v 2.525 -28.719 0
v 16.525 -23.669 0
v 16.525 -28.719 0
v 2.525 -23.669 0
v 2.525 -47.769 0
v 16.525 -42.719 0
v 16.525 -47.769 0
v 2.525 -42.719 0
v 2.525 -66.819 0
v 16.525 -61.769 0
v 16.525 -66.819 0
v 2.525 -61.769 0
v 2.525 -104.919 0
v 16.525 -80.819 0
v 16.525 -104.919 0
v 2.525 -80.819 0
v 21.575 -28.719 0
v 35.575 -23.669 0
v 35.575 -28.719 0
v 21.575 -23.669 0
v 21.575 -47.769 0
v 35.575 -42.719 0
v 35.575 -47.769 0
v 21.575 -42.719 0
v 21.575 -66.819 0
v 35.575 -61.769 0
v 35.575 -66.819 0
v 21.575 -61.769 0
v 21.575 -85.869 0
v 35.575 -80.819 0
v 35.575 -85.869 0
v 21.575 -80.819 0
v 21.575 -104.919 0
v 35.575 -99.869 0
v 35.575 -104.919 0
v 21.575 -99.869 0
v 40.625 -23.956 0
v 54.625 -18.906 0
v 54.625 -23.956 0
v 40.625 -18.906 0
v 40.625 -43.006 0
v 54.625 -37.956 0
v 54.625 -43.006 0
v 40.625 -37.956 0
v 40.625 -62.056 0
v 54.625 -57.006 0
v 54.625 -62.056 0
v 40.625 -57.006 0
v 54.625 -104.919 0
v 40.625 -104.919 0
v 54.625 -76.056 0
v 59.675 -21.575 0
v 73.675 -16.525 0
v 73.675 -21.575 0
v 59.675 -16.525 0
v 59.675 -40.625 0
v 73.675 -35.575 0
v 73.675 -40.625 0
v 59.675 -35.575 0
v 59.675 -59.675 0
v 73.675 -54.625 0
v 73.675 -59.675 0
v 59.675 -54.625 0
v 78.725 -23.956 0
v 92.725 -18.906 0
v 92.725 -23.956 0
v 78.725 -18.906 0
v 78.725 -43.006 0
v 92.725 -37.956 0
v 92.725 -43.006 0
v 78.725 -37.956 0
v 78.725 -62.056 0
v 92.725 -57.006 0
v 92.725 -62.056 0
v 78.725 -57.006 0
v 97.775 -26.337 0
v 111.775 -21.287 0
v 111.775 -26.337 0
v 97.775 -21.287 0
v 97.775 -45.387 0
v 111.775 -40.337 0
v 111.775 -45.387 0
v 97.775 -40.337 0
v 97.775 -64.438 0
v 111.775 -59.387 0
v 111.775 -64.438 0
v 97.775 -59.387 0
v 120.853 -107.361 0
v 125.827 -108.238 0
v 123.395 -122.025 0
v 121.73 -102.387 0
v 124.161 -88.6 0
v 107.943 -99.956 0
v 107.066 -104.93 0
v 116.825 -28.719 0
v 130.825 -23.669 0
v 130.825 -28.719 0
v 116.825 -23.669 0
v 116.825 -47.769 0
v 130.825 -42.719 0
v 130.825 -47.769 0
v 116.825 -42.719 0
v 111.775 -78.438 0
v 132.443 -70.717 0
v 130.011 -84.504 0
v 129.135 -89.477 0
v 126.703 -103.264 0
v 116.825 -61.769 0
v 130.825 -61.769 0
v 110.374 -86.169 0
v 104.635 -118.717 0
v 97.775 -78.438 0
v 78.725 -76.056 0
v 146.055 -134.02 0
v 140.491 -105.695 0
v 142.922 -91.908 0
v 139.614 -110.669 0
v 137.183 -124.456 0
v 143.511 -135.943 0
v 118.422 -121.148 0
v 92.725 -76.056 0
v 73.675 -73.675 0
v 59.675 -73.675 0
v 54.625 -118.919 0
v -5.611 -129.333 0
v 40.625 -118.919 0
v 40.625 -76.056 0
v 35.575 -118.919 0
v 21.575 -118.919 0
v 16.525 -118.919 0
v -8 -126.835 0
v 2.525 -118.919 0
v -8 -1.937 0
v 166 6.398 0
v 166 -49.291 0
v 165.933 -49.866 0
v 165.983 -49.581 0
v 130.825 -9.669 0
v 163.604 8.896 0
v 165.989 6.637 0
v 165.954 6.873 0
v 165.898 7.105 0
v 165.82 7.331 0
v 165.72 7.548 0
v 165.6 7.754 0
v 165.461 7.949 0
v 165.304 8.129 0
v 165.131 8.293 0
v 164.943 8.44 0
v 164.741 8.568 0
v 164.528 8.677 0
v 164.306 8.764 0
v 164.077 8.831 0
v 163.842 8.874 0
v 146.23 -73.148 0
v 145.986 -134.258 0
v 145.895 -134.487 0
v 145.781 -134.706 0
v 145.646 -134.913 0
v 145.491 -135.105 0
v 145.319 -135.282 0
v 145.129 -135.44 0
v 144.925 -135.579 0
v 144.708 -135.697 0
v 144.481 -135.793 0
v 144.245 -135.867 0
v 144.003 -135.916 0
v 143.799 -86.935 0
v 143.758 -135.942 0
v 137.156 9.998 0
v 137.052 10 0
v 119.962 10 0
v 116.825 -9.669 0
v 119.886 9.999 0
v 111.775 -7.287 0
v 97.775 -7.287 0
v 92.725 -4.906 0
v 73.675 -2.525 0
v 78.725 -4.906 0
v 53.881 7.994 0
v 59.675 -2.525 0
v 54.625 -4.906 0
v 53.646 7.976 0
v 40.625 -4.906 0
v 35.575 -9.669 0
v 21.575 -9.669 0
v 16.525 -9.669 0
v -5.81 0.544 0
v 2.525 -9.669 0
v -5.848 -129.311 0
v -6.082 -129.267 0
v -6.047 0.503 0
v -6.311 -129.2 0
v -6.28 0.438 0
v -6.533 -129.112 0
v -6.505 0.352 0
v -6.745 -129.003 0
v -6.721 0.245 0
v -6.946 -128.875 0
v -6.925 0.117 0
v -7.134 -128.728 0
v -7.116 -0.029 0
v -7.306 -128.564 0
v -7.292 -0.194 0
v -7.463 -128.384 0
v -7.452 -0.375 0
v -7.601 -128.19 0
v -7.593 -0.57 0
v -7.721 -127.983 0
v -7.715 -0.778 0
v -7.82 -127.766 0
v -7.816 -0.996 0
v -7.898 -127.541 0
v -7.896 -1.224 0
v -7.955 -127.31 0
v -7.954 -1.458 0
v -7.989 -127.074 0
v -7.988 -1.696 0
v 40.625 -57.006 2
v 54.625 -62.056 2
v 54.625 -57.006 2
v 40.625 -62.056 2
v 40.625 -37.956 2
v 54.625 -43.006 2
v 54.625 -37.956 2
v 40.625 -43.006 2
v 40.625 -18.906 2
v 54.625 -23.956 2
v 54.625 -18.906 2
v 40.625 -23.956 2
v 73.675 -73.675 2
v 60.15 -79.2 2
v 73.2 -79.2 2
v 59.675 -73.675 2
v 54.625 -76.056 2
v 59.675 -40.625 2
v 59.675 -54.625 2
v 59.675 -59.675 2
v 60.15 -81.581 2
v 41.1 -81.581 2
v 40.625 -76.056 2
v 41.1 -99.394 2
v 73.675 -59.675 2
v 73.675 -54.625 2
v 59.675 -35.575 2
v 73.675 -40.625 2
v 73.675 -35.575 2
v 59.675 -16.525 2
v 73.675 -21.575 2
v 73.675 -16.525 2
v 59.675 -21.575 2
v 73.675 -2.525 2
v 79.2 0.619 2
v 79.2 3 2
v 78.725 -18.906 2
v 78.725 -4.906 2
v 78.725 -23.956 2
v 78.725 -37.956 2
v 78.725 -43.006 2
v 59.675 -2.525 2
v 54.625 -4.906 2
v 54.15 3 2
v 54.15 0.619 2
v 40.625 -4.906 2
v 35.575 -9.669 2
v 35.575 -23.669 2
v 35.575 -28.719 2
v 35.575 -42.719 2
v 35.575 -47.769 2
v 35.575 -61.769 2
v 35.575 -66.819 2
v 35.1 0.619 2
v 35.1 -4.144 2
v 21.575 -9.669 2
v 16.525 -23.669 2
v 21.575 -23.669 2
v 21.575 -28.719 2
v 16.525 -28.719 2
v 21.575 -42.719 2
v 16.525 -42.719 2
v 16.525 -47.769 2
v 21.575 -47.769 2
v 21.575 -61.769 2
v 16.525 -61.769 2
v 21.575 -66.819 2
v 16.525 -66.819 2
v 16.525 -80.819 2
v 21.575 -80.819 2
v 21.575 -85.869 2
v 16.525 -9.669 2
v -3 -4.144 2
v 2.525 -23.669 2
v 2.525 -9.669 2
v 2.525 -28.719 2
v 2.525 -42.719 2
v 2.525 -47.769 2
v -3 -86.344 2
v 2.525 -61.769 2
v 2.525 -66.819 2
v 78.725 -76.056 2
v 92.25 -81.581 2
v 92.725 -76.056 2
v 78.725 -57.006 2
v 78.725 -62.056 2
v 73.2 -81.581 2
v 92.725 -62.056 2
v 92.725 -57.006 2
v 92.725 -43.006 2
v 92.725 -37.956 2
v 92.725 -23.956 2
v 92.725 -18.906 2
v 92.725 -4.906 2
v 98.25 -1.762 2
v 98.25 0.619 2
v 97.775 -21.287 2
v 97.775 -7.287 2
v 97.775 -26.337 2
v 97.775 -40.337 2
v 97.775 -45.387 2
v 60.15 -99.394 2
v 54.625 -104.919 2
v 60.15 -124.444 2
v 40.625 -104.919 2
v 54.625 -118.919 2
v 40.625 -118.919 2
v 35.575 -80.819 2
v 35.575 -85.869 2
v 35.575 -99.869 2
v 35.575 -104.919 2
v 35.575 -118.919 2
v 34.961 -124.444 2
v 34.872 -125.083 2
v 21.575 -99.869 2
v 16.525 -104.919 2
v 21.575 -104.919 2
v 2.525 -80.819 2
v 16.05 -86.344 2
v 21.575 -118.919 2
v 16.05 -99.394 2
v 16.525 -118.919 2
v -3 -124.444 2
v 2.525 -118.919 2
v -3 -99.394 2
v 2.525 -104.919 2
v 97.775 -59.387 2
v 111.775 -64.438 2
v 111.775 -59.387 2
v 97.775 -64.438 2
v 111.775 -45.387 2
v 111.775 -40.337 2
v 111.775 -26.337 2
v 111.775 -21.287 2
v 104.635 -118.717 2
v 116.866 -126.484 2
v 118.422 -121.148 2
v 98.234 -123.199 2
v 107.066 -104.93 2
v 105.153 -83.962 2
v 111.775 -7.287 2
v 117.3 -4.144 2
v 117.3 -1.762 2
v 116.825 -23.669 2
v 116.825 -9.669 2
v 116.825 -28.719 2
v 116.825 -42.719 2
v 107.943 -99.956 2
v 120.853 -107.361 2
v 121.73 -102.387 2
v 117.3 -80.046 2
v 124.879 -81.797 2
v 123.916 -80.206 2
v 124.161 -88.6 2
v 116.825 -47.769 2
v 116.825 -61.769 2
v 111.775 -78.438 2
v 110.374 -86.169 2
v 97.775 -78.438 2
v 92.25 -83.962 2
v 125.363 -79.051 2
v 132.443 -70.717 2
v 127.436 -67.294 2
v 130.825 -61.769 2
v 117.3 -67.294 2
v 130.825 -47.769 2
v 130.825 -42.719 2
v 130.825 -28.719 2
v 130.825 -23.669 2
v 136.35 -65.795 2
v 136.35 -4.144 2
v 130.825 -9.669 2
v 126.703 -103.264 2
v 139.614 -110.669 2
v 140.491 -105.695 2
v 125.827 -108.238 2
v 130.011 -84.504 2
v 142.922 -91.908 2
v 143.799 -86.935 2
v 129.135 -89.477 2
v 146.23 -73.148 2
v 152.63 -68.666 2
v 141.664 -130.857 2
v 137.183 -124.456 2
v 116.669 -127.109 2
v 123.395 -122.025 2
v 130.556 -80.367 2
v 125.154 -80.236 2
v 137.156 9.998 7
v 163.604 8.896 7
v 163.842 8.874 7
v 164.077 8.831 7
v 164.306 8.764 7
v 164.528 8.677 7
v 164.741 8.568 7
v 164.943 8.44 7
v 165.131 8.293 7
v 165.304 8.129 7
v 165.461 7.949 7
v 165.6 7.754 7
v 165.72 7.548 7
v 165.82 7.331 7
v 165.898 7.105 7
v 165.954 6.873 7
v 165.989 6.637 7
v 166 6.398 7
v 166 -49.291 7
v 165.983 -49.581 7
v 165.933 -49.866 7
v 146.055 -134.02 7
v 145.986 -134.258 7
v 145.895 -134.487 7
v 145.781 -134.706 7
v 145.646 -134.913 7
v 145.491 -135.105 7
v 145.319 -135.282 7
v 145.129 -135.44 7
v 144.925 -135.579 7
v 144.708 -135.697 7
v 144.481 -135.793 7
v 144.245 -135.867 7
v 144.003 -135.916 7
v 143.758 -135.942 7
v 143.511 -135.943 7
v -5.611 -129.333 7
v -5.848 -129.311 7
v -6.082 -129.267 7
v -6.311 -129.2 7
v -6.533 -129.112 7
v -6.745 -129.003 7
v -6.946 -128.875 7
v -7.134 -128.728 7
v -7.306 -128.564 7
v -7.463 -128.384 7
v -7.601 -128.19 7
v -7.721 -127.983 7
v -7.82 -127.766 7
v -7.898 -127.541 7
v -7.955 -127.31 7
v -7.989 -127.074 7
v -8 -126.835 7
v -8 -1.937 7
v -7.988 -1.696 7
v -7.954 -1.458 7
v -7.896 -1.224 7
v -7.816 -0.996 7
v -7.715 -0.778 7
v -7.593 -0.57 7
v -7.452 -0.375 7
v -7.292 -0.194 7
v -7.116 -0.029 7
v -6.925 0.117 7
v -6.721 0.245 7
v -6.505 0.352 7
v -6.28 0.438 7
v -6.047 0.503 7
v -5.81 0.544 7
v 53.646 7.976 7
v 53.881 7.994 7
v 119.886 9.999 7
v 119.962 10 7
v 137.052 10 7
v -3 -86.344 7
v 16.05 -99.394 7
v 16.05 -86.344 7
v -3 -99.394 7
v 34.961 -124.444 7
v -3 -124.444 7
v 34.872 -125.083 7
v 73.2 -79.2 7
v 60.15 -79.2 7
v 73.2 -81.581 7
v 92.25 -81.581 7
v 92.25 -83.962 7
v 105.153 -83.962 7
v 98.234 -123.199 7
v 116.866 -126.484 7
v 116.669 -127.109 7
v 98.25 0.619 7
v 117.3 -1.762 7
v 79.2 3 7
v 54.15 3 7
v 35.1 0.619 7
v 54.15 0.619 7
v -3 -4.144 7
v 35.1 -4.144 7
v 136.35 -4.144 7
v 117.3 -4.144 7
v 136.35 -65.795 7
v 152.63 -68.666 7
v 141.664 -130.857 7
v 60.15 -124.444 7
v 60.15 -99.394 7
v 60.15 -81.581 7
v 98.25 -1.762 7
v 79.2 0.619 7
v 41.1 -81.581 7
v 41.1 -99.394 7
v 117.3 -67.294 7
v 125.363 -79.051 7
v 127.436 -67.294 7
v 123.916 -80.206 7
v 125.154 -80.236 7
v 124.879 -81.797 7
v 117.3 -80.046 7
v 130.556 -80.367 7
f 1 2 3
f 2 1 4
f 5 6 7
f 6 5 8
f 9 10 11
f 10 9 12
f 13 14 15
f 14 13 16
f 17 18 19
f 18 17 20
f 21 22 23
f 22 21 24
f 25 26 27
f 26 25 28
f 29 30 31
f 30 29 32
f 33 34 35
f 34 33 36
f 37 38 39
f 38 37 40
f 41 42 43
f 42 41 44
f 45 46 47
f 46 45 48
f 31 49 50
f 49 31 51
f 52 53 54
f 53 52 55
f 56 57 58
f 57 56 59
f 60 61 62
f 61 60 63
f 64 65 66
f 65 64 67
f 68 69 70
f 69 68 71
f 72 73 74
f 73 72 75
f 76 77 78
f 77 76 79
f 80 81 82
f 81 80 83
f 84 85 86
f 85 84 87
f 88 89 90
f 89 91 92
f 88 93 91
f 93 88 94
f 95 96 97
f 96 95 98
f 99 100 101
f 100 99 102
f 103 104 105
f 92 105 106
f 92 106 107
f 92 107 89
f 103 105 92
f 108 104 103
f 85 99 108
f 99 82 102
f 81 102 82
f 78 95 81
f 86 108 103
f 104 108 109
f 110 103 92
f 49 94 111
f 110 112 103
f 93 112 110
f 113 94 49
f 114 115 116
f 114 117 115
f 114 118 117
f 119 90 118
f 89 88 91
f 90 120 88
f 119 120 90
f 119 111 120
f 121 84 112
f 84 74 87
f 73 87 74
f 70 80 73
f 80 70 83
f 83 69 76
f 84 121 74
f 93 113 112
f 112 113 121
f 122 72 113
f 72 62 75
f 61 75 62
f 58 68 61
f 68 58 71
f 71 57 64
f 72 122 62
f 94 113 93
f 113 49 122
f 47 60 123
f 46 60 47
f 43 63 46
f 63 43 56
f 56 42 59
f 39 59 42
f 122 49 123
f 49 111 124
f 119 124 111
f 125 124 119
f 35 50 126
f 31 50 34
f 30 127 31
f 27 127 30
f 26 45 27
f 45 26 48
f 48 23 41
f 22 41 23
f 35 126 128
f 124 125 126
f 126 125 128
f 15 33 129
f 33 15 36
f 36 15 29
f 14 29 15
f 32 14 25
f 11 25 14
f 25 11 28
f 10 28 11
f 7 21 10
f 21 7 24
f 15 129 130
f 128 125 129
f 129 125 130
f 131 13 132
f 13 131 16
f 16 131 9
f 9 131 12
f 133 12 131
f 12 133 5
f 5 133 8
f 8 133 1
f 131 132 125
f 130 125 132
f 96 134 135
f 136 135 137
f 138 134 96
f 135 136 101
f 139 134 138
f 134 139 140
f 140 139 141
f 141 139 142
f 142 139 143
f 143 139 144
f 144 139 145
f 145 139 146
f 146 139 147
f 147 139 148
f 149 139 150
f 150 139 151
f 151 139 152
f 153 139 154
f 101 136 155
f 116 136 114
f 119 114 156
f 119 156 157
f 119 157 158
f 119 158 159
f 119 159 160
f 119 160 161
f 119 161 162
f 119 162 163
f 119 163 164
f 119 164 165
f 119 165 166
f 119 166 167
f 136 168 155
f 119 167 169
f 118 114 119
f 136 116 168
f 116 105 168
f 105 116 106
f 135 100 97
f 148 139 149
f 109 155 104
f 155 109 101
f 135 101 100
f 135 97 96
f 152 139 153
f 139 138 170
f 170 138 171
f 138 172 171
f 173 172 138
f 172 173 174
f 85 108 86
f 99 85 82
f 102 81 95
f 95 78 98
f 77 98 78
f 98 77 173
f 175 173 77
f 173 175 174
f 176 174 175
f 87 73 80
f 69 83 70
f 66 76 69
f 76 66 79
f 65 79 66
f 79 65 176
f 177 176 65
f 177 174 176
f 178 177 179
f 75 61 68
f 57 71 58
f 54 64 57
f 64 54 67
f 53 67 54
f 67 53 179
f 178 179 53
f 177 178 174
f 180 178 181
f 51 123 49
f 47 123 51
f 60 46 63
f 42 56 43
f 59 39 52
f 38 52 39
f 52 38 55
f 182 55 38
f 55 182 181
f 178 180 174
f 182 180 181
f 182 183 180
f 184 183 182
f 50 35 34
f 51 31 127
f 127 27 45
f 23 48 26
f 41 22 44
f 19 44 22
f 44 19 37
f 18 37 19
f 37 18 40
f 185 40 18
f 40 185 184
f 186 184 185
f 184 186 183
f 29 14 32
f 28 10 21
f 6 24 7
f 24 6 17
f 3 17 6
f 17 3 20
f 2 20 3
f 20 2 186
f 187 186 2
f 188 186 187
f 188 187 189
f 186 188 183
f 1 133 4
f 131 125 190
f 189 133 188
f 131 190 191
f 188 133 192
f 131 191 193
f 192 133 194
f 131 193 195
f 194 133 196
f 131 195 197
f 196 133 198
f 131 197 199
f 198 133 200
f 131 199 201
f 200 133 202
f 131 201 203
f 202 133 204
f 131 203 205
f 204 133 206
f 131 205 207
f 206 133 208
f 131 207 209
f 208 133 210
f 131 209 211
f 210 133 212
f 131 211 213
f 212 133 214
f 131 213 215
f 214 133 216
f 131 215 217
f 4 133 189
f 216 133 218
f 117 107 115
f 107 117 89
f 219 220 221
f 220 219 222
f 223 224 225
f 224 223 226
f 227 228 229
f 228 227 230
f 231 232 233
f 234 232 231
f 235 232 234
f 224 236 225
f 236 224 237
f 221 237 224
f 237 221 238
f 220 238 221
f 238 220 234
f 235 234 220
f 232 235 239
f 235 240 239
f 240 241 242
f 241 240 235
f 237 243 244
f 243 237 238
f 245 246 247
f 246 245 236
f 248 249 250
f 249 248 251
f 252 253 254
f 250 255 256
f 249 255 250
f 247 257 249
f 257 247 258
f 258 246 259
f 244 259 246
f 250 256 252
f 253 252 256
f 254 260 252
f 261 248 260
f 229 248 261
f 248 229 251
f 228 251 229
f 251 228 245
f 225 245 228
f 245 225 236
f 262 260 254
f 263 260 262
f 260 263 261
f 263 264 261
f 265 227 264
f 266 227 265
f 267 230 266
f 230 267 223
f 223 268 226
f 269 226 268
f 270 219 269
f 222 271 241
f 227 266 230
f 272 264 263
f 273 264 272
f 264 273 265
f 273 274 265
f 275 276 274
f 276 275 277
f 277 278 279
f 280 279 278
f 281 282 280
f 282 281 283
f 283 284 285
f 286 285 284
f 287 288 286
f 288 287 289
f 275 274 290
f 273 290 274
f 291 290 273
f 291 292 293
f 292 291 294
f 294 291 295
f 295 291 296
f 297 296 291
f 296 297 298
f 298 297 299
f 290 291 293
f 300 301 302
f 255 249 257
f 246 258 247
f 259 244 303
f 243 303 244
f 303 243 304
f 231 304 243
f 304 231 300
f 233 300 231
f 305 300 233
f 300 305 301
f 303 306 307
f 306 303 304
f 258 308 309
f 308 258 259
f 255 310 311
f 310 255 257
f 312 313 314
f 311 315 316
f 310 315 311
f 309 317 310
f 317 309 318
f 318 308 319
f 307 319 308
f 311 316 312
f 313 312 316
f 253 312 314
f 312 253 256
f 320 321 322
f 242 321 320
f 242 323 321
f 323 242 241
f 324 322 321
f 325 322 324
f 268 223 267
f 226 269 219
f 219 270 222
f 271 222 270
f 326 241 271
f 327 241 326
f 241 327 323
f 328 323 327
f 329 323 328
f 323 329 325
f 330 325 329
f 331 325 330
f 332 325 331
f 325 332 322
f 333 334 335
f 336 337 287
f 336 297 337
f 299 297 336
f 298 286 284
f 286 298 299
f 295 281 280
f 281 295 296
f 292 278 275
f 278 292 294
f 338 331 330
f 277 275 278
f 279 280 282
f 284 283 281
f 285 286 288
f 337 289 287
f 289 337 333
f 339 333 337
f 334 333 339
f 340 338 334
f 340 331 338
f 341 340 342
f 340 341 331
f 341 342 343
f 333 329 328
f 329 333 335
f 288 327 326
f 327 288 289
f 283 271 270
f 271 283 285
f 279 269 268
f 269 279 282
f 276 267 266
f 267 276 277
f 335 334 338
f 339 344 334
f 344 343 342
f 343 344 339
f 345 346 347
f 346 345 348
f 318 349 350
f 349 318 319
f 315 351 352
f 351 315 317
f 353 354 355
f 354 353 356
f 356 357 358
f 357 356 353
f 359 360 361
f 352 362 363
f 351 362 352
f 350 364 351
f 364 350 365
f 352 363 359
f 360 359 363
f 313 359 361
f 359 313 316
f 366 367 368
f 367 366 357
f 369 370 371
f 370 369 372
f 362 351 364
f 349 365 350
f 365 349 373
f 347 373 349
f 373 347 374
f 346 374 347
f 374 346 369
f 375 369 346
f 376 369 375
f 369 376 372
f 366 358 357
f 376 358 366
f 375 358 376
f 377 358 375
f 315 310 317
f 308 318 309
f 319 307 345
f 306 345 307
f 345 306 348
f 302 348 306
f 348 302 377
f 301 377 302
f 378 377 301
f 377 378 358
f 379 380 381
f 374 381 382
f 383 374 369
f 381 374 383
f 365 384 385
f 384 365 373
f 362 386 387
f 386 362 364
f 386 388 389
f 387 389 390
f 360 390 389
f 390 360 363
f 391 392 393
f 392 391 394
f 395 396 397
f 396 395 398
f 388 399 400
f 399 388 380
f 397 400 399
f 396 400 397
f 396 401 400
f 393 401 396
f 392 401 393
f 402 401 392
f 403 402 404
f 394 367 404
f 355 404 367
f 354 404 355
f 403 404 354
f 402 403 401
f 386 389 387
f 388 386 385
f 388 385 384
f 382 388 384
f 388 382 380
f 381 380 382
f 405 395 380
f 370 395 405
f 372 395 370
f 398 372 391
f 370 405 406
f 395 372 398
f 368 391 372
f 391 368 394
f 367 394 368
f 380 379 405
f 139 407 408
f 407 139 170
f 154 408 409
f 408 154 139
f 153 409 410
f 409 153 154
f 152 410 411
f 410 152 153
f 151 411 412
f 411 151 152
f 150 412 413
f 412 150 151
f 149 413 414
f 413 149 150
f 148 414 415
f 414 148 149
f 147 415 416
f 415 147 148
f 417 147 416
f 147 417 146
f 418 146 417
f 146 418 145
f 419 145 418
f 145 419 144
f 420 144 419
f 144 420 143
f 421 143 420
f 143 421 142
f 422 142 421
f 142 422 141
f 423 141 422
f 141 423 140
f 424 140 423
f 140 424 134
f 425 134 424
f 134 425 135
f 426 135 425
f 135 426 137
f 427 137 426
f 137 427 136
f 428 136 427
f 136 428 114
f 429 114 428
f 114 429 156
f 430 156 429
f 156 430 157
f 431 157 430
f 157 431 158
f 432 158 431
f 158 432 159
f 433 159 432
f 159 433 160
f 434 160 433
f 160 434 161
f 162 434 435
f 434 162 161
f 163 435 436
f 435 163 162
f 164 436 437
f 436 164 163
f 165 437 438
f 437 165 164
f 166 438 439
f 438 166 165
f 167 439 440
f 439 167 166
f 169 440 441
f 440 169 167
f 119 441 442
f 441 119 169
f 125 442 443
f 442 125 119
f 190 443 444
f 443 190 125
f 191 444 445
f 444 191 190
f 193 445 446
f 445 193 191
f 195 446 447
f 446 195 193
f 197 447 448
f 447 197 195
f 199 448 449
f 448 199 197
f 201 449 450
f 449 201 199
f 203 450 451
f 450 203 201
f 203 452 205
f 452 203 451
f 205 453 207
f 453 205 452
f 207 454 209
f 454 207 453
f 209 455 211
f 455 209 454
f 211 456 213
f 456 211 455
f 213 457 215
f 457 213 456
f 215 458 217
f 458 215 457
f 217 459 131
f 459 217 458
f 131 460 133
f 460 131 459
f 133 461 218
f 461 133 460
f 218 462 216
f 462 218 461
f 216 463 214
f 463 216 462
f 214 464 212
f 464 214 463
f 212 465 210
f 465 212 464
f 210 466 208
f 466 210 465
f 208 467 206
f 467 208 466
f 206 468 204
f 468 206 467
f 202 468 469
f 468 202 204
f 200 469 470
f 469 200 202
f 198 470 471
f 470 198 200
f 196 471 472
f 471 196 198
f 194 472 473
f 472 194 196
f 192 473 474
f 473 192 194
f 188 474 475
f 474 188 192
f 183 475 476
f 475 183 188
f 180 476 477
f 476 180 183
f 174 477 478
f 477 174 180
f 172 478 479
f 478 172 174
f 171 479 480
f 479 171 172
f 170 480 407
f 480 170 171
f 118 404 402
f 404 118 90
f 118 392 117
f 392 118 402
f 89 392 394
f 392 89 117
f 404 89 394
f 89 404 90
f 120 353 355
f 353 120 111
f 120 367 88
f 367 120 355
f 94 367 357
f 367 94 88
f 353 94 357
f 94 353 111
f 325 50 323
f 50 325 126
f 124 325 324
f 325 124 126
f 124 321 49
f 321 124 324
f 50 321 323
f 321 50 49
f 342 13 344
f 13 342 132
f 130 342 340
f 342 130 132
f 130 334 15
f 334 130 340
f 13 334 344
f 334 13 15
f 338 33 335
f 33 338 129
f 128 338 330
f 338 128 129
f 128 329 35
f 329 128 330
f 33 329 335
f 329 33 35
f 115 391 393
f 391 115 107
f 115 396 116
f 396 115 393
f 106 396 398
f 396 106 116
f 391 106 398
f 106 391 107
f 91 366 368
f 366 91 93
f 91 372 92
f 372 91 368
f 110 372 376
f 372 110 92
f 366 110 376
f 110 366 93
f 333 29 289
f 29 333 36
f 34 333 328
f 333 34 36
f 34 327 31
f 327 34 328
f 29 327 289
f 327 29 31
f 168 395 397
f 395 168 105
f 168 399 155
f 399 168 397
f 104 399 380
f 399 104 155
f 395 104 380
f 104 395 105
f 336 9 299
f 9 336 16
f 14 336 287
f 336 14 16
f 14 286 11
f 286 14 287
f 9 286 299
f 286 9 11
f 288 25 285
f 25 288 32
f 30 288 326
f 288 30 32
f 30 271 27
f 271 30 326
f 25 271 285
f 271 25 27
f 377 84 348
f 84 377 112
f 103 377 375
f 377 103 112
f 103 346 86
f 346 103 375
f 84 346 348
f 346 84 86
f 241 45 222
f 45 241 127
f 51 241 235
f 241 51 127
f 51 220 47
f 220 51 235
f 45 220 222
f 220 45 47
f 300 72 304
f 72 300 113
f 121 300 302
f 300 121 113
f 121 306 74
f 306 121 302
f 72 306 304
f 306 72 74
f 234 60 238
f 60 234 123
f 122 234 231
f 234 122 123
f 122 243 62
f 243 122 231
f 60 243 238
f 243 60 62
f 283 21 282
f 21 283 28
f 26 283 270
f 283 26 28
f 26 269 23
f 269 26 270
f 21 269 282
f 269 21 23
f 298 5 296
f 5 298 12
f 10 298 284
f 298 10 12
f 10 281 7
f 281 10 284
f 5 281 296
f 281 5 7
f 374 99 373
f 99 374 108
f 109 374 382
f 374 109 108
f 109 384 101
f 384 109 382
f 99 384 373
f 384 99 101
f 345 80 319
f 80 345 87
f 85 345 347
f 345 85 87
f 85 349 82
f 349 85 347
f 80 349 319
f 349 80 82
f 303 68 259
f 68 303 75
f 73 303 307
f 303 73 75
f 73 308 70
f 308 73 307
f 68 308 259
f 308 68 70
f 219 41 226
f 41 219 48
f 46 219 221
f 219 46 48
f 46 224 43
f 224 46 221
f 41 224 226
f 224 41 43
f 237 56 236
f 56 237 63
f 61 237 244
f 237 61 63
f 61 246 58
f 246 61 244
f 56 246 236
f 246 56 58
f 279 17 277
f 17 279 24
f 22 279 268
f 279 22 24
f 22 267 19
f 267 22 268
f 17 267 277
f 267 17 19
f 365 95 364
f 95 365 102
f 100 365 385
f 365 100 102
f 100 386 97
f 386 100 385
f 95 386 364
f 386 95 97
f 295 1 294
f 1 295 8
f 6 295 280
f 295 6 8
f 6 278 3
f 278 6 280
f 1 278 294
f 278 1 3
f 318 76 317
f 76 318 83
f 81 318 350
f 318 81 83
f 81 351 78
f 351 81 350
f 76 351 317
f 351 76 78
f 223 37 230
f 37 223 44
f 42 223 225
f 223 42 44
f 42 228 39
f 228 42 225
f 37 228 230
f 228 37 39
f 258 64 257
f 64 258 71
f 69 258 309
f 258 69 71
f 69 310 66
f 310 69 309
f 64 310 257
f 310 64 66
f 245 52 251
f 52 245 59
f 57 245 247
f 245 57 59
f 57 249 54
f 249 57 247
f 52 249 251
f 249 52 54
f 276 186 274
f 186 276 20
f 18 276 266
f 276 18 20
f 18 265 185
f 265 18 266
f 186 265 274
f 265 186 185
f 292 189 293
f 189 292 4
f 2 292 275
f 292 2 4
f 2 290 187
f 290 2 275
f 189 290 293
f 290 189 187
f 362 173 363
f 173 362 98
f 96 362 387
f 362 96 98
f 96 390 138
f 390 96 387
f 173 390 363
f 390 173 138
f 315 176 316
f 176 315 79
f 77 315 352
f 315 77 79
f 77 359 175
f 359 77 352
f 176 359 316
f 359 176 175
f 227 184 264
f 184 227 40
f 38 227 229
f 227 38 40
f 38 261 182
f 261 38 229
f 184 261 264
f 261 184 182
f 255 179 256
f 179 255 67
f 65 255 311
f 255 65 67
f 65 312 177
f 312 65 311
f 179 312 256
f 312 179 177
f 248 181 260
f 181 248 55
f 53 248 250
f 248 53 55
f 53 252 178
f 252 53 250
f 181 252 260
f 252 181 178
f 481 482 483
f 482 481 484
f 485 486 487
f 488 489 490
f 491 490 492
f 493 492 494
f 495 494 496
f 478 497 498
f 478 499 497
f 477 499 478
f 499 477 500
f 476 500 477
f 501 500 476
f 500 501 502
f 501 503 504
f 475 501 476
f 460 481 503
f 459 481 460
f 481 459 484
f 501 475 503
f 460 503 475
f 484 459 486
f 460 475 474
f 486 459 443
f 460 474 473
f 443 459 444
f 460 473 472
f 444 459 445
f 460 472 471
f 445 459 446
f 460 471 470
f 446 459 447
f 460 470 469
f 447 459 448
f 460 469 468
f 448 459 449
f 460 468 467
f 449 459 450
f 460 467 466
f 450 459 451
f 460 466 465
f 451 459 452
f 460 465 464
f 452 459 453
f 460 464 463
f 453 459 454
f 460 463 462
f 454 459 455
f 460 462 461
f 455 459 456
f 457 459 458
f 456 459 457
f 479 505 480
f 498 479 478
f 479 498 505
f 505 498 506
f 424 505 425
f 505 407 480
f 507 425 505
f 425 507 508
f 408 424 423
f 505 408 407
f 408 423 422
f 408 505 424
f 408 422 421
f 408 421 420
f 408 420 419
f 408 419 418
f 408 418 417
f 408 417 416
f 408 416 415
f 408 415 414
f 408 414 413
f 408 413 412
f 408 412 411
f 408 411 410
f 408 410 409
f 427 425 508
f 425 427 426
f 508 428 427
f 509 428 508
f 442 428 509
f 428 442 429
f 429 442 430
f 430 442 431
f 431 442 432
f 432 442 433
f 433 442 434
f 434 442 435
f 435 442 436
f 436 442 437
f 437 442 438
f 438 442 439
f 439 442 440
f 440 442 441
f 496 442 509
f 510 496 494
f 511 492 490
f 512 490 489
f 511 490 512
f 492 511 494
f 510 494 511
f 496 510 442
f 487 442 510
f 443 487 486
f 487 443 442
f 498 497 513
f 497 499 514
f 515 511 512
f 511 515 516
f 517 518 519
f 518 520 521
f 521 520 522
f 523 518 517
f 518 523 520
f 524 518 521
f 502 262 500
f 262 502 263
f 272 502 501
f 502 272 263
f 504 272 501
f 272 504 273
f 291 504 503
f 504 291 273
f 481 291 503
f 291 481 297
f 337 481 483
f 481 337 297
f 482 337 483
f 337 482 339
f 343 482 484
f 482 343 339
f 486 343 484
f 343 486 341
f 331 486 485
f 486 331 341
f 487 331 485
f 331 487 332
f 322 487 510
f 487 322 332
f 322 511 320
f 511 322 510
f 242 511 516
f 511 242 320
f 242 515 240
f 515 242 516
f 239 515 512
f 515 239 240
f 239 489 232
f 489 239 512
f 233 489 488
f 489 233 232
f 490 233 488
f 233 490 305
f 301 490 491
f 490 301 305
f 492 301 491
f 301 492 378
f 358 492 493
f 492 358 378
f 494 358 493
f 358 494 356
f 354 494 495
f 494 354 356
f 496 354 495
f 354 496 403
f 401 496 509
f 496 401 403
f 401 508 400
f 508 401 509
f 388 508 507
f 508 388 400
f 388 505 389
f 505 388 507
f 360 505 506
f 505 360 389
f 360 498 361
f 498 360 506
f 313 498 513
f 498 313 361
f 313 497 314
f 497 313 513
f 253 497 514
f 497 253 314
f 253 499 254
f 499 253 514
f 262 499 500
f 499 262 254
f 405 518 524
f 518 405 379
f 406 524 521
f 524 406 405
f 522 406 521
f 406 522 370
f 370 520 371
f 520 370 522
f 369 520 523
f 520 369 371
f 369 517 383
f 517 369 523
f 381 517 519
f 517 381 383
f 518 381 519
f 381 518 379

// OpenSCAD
mirror([0, 1, 0]) color("grey") {
union() {
linear_extrude(height=2) {
polygon([[119.9620436791635, -10.0], [119.88614853201763, -9.998847719777999], [53.880686985647216, -7.994126032720432], [53.646495296320076, -7.975973004726603], [-5.810086836473021, -0.5439002381274649], [-6.047487665291121, -0.5025204617148387], [-6.279801550623147, -0.4384759607689326], [-6.504869964194179, -0.3523618003068363], [-6.720601698525187, -0.2449781040489396], [-6.9249922972416, -0.11732262012514494], [-7.116142679340018, 0.029418549432351115], [-7.292276784366992, 0.19388196927341883], [-7.451758074560958, 0.3745395389945354], [-7.593104740628792, 0.569712691377185], [-7.71500346987358, 0.7775879886781831], [-7.816321648748018, 0.9962339720600868], [-7.896117886454252, 1.2236191076063734], [-7.953650761810862, 1.45763066217724], [-7.988385712116106, 1.69609433372233], [-8.0, 1.9367944536567043], [-8.000000000000002, 99.39375], [-7.999999999999999, 126.83538329329558], [-7.988630737664156, 127.07353671349598], [-7.954626358757477, 127.30952403072804], [-7.898296147043448, 127.54119884361772], [-7.820152448885596, 127.76645397478553], [-7.720906013247321, 127.98324063648849], [-7.601459527138758, 128.18958706518433], [-7.462899405308439, 128.38361645552916], [-7.306485908855863, 128.56356403069117], [-7.133641682640258, 128.72779309371944], [-6.945938815742489, 128.87480991397337], [-6.745084542670518, 129.00327731321514], [-6.532905715361807, 129.11202682779387], [-6.311332187216184, 129.2000693363015], [-6.082379260288182, 129.26660405603724], [-5.848129355288844, 129.31102582645462], [-5.610713071115836, 129.33293061334462], [143.51094867944454, 135.94330272112006], [143.7578335033689, 135.94204409706296], [144.00339029973705, 135.9164401876724], [144.2452242532848, 135.86674069743202], [144.48097685611515, 135.79343032519606], [144.70834890926406, 135.69722403711918], [144.9251229458497, 135.57906009388333], [145.1291848571225, 135.44009090022388], [145.3185445105055, 135.2816717659965], [145.49135515854522, 135.10534768839287], [145.6459314494865, 134.91283828421348], [145.78076586382062, 134.70602101914633], [145.89454341650796, 134.48691289761004], [145.98615448149076, 134.25765079173254], [146.05470561342344, 134.02047060130883], [165.9330438628631, 49.86597310114771], [165.98320454827606, 49.58055907861434], [166.00000000000003, 49.291257900909926], [166.0, -6.398002531138397], [165.98859115294965, -6.63656923766047], [165.95446874123138, -6.872958527329727], [165.89794420274623, -7.105012856746026], [165.81953344134553, -7.3306142480280165], [165.7199521181364, -7.5477036197617124], [165.60010911958736, -7.754299580396419], [165.46109826205074, -7.9485165125592525], [165.30418830841614, -8.128581783231304], [165.13081138801294, -8.29285192270683], [164.9425499254547, -8.439827624668856], [164.7411221977268, -8.56816743047434], [164.52836665133918, -8.676699972751353], [164.3062251226821, -8.764434666560037], [164.07672511473476, -8.830570750538252], [163.8419612918881, -8.874504595512704], [163.60407636178044, -8.895835213869276], [137.156137109102, -9.99783268273088], [137.05206074732155, -10.0], [119.9620436791635, -10.0], [146.22988117819344, 73.14758746355804], [143.7988066908564, 86.93489600572894], [130.0114981486855, 84.50382151839193], [132.4425726360225, 70.71651297622101], [146.22988117819344, 73.14758746355804], [142.92188339363838, 91.90817515844061], [140.49080890630137, 105.69548370061152], [126.70350036413045, 103.2644092132745], [129.13457485146748, 89.4771006711036], [142.92188339363838, 91.90817515844061], [139.61388560908333, 110.66876285332319], [137.1828111217463, 124.45607139549409], [123.3955025795754, 122.02499690815708], [125.82657706691242, 108.23768836598617], [139.61388560908333, 110.66876285332319], [130.82500000000005, 47.768750000000004], [130.82500000000005, 61.768750000000004], [116.82500000000003, 61.768750000000004], [116.82500000000003, 47.768750000000004], [130.82500000000005, 47.768750000000004], [130.82500000000005, 28.718750000000007], [130.82500000000005, 42.71875000000001], [116.82500000000003, 42.71875000000001], [116.82500000000003, 28.718750000000007], [130.82500000000005, 28.718750000000007], [130.82500000000005, 9.668750000000003], [130.82500000000005, 23.668750000000003], [116.82500000000003, 23.668750000000003], [116.82500000000003, 9.668750000000003], [130.82500000000005, 9.668750000000003], [124.16129569875584, 88.60017737388559], [121.73022121141881, 102.3874859160565], [107.94291266924789, 99.95641142871948], [110.37398715658492, 86.16910288654856], [124.16129569875584, 88.60017737388559], [120.85329791420082, 107.36076506876817], [118.4222234268638, 121.14807361093908], [104.63491488469289, 118.71699912360204], [107.0659893720299, 104.92969058143115], [120.85329791420082, 107.36076506876817], [111.77500000000002, 7.287500000000003], [111.77500000000002, 21.2875], [97.77500000000002, 21.2875], [97.77500000000002, 7.287500000000003], [111.77500000000002, 7.287500000000003], [111.775, 64.4375], [111.775, 78.4375], [97.775, 78.4375], [97.775, 64.4375], [111.775, 64.4375], [111.775, 45.3875], [111.775, 59.3875], [97.775, 59.3875], [97.775, 45.3875], [111.775, 45.3875], [111.775, 26.3375], [111.775, 40.3375], [97.775, 40.3375], [97.775, 26.3375], [111.775, 26.3375], [92.725, 62.056250000000006], [92.725, 76.05625], [78.725, 76.05625], [78.725, 62.056250000000006], [92.725, 62.056250000000006], [92.725, 43.006249999999994], [92.725, 57.006249999999994], [78.725, 57.006249999999994], [78.725, 43.006249999999994], [92.725, 43.006249999999994], [92.725, 23.956250000000004], [92.725, 37.956250000000004], [78.725, 37.956250000000004], [78.725, 23.956250000000004], [92.725, 23.956250000000004], [92.725, 4.906250000000002], [92.725, 18.90625], [78.725, 18.90625], [78.725, 4.906250000000002], [92.725, 4.906250000000002], [73.67500000000001, 21.575], [73.67500000000001, 35.575], [59.67500000000001, 35.575], [59.67500000000001, 21.575], [73.67500000000001, 21.575], [73.67500000000001, 40.625], [73.67500000000001, 54.625], [59.67500000000001, 54.625], [59.67500000000001, 40.625], [73.67500000000001, 40.625], [73.67500000000001, 2.5249999999999986], [73.67500000000001, 16.525], [59.67500000000001, 16.525], [59.67500000000001, 2.5249999999999986], [73.67500000000001, 2.5249999999999986], [73.675, 59.675], [73.675, 73.675], [59.675, 73.675], [59.675, 59.675], [73.675, 59.675], [54.625, 104.91875], [54.625, 118.91875], [40.625, 118.91875], [40.625, 104.91875], [54.625, 104.91875], [54.625, 62.056250000000006], [54.625, 76.05625], [40.625, 76.05625], [40.625, 62.056250000000006], [54.625, 62.056250000000006], [54.625, 43.00625], [54.625, 57.00625], [40.625, 57.00625], [40.625, 43.00625], [54.625, 43.00625], [54.625, 23.95625], [54.625, 37.95625], [40.625, 37.95625], [40.625, 23.95625], [54.625, 23.95625], [54.625, 4.90625], [54.625, 18.90625], [40.625, 18.90625], [40.625, 4.90625], [54.625, 4.90625], [35.575, 85.86875], [35.575, 99.86875], [21.575, 99.86875], [21.575, 85.86875], [35.575, 85.86875], [35.575, 9.668750000000003], [35.575, 23.668750000000003], [21.575, 23.668750000000003], [21.575, 9.668750000000003], [35.575, 9.668750000000003], [35.575, 28.71875], [35.575, 42.71875], [21.575, 42.71875], [21.575, 28.71875], [35.575, 28.71875], [35.575, 47.768750000000004], [35.575, 61.768750000000004], [21.575, 61.768750000000004], [21.575, 47.768750000000004], [35.575, 47.768750000000004], [35.575, 66.81875], [35.575, 80.81875], [21.575, 80.81875], [21.575, 66.81875], [35.575, 66.81875], [35.575, 104.91875], [35.575, 118.91875], [21.575, 118.91875], [21.575, 104.91875], [35.575, 104.91875], [16.525, 9.668750000000003], [16.525, 23.668750000000003], [2.5250000000000004, 23.668750000000003], [2.5250000000000004, 9.668750000000003], [16.525, 9.668750000000003], [16.525, 104.91875], [16.525, 118.91875], [2.5249999999999986, 118.91875], [2.5249999999999986, 104.91875], [16.525, 104.91875], [16.525, 66.81875], [16.525, 80.81875], [2.5249999999999986, 80.81875], [2.5249999999999986, 66.81875], [16.525, 66.81875], [16.525, 47.768750000000004], [16.525, 61.768750000000004], [2.5250000000000004, 61.768750000000004], [2.5250000000000004, 47.768750000000004], [16.525, 47.768750000000004], [16.525, 28.71875], [16.525, 42.71875], [2.5250000000000004, 42.71875], [2.5250000000000004, 28.71875], [16.525, 28.71875]], [[0, 1, 2, 3, 4, 5, 6, 7, 8, 9, 10, 11, 12, 13, 14, 15, 16, 17, 18, 19, 20, 21, 22, 23, 24, 25, 26, 27, 28, 29, 30, 31, 32, 33, 34, 35, 36, 37, 38, 39, 40, 41, 42, 43, 44, 45, 46, 47, 48, 49, 50, 51, 52, 53, 54, 55, 56, 57, 58, 59, 60, 61, 62, 63, 64, 65, 66, 67, 68, 69, 70, 71, 72, 73, 74, 75], [76, 77, 78, 79, 80], [81, 82, 83, 84, 85], [86, 87, 88, 89, 90], [91, 92, 93, 94, 95], [96, 97, 98, 99, 100], [101, 102, 103, 104, 105], [106, 107, 108, 109, 110], [111, 112, 113, 114, 115], [116, 117, 118, 119, 120], [121, 122, 123, 124, 125], [126, 127, 128, 129, 130], [131, 132, 133, 134, 135], [136, 137, 138, 139, 140], [141, 142, 143, 144, 145], [146, 147, 148, 149, 150], [151, 152, 153, 154, 155], [156, 157, 158, 159, 160], [161, 162, 163, 164, 165], [166, 167, 168, 169, 170], [171, 172, 173, 174, 175], [176, 177, 178, 179, 180], [181, 182, 183, 184, 185], [186, 187, 188, 189, 190], [191, 192, 193, 194, 195], [196, 197, 198, 199, 200], [201, 202, 203, 204, 205], [206, 207, 208, 209, 210], [211, 212, 213, 214, 215], [216, 217, 218, 219, 220], [221, 222, 223, 224, 225], [226, 227, 228, 229, 230], [231, 232, 233, 234, 235], [236, 237, 238, 239, 240], [241, 242, 243, 244, 245], [246, 247, 248, 249, 250], [251, 252, 253, 254, 255]]);

}
translate(v=[0, 0, 2]) {
linear_extrude(height=5) {
union() {
polygon([[119.9620436791635, -10.0], [119.88614853201763, -9.998847719777999], [53.880686985647216, -7.994126032720432], [53.646495296320076, -7.975973004726603], [-5.810086836473021, -0.5439002381274649], [-6.047487665291121, -0.5025204617148387], [-6.279801550623147, -0.4384759607689326], [-6.504869964194179, -0.3523618003068363], [-6.720601698525187, -0.2449781040489396], [-6.9249922972416, -0.11732262012514494], [-7.116142679340018, 0.029418549432351115], [-7.292276784366992, 0.19388196927341883], [-7.451758074560958, 0.3745395389945354], [-7.593104740628792, 0.569712691377185], [-7.71500346987358, 0.7775879886781831], [-7.816321648748018, 0.9962339720600868], [-7.896117886454252, 1.2236191076063734], [-7.953650761810862, 1.45763066217724], [-7.988385712116106, 1.69609433372233], [-8.0, 1.9367944536567043], [-8.000000000000002, 99.39375], [-7.999999999999999, 126.83538329329558], [-7.988630737664156, 127.07353671349598], [-7.954626358757477, 127.30952403072804], [-7.898296147043448, 127.54119884361772], [-7.820152448885596, 127.76645397478553], [-7.720906013247321, 127.98324063648849], [-7.601459527138758, 128.18958706518433], [-7.462899405308439, 128.38361645552916], [-7.306485908855863, 128.56356403069117], [-7.133641682640258, 128.72779309371944], [-6.945938815742489, 128.87480991397337], [-6.745084542670518, 129.00327731321514], [-6.532905715361807, 129.11202682779387], [-6.311332187216184, 129.2000693363015], [-6.082379260288182, 129.26660405603724], [-5.848129355288844, 129.31102582645462], [-5.610713071115836, 129.33293061334462], [143.51094867944454, 135.94330272112006], [143.7578335033689, 135.94204409706296], [144.00339029973705, 135.9164401876724], [144.2452242532848, 135.86674069743202], [144.48097685611515, 135.79343032519606], [144.70834890926406, 135.69722403711918], [144.9251229458497, 135.57906009388333], [145.1291848571225, 135.44009090022388], [145.3185445105055, 135.2816717659965], [145.49135515854522, 135.10534768839287], [145.6459314494865, 134.91283828421348], [145.78076586382062, 134.70602101914633], [145.89454341650796, 134.48691289761004], [145.98615448149076, 134.25765079173254], [146.05470561342344, 134.02047060130883], [165.9330438628631, 49.86597310114771], [165.98320454827606, 49.58055907861434], [166.00000000000003, 49.291257900909926], [166.0, -6.398002531138397], [165.98859115294965, -6.63656923766047], [165.95446874123138, -6.872958527329727], [165.89794420274623, -7.105012856746026], [165.81953344134553, -7.3306142480280165], [165.7199521181364, -7.5477036197617124], [165.60010911958736, -7.754299580396419], [165.46109826205074, -7.9485165125592525], [165.30418830841614, -8.128581783231304], [165.13081138801294, -8.29285192270683], [164.9425499254547, -8.439827624668856], [164.7411221977268, -8.56816743047434], [164.52836665133918, -8.676699972751353], [164.3062251226821, -8.764434666560037], [164.07672511473476, -8.830570750538252], [163.8419612918881, -8.874504595512704], [163.60407636178044, -8.895835213869276], [137.156137109102, -9.99783268273088], [137.05206074732155, -10.0], [119.9620436791635, -10.0], [34.87156720064472, 125.08274924334616], [34.96062665966282, 124.44374999999998], [-3.000000000000001, 124.44374999999998], [-3.0000000000000013, 99.39375], [16.050000000000004, 99.39375], [16.04999999999999, 86.34375], [-3.0, 86.34375], [-3.0000000000000004, 4.143750000000001], [35.10000000000001, 4.143750000000001], [35.100000000000016, -0.6187499999999999], [54.15, -0.6187499999999999], [54.15000000000001, -3.0000000000000013], [79.2, -3.0000000000000013], [79.2, -0.6187499999999999], [98.25000000000001, -0.6187499999999998], [98.25, 1.762500000000001], [117.3, 1.7625000000000017], [117.29999999999998, 4.143749999999999], [136.35000000000002, 4.143750000000002], [136.35000000000005, 24.19375], [136.35000000000005, 65.79526581498008], [152.6303501951956, 68.66593080977538], [149.14870423297376, 88.41132625767018], [145.84070644841873, 107.17191395255269], [141.664467775529, 130.85654041249649], [116.66854633478026, 127.10921194740828], [116.86608588567066, 126.48391660740211], [98.23444586769057, 123.19865577738476], [101.71609182991254, 103.45326032948991], [105.1528387505238, 83.96250000000003], [92.24999999999987, 83.96250000000003], [92.25, 81.58124999999998], [73.19999999999963, 81.58125000000001], [73.20000000000002, 79.19999999999996], [60.149999999999984, 79.19999999999996], [60.149999999999764, 81.58125000000003], [41.100000000000016, 81.58125000000001], [41.100000000000016, 99.39375000000001], [60.149999999999984, 99.39375], [60.14999999999999, 124.44375], [34.87156720064472, 125.08274924334616]], [[0, 1, 2, 3, 4, 5, 6, 7, 8, 9, 10, 11, 12, 13, 14, 15, 16, 17, 18, 19, 20, 21, 22, 23, 24, 25, 26, 27, 28, 29, 30, 31, 32, 33, 34, 35, 36, 37, 38, 39, 40, 41, 42, 43, 44, 45, 46, 47, 48, 49, 50, 51, 52, 53, 54, 55, 56, 57, 58, 59, 60, 61, 62, 63, 64, 65, 66, 67, 68, 69, 70, 71, 72, 73, 74, 75], [76, 77, 78, 79, 80, 81, 82, 83, 84, 85, 86, 87, 88, 89, 90, 91, 92, 93, 94, 95, 96, 97, 98, 99, 100, 101, 102, 103, 104, 105, 106, 107, 108, 109, 110, 111, 112, 113, 114, 115, 116]]);

polygon([[117.29999999999997, 80.0455395898675], [123.91558021508602, 80.20612383586537], [124.8785755520589, 81.7968652027765], [125.15376661456881, 80.23617913304282], [130.55645011989614, 80.36732195481524], [125.36267357887374, 79.05140886438873], [127.43586606663155, 67.29374999999999], [117.30000000000004, 67.29374999999997], [117.29999999999997, 80.0455395898675]], [[0, 1, 2, 3, 4, 5, 6, 7, 8]]);

}
}
}
}}
